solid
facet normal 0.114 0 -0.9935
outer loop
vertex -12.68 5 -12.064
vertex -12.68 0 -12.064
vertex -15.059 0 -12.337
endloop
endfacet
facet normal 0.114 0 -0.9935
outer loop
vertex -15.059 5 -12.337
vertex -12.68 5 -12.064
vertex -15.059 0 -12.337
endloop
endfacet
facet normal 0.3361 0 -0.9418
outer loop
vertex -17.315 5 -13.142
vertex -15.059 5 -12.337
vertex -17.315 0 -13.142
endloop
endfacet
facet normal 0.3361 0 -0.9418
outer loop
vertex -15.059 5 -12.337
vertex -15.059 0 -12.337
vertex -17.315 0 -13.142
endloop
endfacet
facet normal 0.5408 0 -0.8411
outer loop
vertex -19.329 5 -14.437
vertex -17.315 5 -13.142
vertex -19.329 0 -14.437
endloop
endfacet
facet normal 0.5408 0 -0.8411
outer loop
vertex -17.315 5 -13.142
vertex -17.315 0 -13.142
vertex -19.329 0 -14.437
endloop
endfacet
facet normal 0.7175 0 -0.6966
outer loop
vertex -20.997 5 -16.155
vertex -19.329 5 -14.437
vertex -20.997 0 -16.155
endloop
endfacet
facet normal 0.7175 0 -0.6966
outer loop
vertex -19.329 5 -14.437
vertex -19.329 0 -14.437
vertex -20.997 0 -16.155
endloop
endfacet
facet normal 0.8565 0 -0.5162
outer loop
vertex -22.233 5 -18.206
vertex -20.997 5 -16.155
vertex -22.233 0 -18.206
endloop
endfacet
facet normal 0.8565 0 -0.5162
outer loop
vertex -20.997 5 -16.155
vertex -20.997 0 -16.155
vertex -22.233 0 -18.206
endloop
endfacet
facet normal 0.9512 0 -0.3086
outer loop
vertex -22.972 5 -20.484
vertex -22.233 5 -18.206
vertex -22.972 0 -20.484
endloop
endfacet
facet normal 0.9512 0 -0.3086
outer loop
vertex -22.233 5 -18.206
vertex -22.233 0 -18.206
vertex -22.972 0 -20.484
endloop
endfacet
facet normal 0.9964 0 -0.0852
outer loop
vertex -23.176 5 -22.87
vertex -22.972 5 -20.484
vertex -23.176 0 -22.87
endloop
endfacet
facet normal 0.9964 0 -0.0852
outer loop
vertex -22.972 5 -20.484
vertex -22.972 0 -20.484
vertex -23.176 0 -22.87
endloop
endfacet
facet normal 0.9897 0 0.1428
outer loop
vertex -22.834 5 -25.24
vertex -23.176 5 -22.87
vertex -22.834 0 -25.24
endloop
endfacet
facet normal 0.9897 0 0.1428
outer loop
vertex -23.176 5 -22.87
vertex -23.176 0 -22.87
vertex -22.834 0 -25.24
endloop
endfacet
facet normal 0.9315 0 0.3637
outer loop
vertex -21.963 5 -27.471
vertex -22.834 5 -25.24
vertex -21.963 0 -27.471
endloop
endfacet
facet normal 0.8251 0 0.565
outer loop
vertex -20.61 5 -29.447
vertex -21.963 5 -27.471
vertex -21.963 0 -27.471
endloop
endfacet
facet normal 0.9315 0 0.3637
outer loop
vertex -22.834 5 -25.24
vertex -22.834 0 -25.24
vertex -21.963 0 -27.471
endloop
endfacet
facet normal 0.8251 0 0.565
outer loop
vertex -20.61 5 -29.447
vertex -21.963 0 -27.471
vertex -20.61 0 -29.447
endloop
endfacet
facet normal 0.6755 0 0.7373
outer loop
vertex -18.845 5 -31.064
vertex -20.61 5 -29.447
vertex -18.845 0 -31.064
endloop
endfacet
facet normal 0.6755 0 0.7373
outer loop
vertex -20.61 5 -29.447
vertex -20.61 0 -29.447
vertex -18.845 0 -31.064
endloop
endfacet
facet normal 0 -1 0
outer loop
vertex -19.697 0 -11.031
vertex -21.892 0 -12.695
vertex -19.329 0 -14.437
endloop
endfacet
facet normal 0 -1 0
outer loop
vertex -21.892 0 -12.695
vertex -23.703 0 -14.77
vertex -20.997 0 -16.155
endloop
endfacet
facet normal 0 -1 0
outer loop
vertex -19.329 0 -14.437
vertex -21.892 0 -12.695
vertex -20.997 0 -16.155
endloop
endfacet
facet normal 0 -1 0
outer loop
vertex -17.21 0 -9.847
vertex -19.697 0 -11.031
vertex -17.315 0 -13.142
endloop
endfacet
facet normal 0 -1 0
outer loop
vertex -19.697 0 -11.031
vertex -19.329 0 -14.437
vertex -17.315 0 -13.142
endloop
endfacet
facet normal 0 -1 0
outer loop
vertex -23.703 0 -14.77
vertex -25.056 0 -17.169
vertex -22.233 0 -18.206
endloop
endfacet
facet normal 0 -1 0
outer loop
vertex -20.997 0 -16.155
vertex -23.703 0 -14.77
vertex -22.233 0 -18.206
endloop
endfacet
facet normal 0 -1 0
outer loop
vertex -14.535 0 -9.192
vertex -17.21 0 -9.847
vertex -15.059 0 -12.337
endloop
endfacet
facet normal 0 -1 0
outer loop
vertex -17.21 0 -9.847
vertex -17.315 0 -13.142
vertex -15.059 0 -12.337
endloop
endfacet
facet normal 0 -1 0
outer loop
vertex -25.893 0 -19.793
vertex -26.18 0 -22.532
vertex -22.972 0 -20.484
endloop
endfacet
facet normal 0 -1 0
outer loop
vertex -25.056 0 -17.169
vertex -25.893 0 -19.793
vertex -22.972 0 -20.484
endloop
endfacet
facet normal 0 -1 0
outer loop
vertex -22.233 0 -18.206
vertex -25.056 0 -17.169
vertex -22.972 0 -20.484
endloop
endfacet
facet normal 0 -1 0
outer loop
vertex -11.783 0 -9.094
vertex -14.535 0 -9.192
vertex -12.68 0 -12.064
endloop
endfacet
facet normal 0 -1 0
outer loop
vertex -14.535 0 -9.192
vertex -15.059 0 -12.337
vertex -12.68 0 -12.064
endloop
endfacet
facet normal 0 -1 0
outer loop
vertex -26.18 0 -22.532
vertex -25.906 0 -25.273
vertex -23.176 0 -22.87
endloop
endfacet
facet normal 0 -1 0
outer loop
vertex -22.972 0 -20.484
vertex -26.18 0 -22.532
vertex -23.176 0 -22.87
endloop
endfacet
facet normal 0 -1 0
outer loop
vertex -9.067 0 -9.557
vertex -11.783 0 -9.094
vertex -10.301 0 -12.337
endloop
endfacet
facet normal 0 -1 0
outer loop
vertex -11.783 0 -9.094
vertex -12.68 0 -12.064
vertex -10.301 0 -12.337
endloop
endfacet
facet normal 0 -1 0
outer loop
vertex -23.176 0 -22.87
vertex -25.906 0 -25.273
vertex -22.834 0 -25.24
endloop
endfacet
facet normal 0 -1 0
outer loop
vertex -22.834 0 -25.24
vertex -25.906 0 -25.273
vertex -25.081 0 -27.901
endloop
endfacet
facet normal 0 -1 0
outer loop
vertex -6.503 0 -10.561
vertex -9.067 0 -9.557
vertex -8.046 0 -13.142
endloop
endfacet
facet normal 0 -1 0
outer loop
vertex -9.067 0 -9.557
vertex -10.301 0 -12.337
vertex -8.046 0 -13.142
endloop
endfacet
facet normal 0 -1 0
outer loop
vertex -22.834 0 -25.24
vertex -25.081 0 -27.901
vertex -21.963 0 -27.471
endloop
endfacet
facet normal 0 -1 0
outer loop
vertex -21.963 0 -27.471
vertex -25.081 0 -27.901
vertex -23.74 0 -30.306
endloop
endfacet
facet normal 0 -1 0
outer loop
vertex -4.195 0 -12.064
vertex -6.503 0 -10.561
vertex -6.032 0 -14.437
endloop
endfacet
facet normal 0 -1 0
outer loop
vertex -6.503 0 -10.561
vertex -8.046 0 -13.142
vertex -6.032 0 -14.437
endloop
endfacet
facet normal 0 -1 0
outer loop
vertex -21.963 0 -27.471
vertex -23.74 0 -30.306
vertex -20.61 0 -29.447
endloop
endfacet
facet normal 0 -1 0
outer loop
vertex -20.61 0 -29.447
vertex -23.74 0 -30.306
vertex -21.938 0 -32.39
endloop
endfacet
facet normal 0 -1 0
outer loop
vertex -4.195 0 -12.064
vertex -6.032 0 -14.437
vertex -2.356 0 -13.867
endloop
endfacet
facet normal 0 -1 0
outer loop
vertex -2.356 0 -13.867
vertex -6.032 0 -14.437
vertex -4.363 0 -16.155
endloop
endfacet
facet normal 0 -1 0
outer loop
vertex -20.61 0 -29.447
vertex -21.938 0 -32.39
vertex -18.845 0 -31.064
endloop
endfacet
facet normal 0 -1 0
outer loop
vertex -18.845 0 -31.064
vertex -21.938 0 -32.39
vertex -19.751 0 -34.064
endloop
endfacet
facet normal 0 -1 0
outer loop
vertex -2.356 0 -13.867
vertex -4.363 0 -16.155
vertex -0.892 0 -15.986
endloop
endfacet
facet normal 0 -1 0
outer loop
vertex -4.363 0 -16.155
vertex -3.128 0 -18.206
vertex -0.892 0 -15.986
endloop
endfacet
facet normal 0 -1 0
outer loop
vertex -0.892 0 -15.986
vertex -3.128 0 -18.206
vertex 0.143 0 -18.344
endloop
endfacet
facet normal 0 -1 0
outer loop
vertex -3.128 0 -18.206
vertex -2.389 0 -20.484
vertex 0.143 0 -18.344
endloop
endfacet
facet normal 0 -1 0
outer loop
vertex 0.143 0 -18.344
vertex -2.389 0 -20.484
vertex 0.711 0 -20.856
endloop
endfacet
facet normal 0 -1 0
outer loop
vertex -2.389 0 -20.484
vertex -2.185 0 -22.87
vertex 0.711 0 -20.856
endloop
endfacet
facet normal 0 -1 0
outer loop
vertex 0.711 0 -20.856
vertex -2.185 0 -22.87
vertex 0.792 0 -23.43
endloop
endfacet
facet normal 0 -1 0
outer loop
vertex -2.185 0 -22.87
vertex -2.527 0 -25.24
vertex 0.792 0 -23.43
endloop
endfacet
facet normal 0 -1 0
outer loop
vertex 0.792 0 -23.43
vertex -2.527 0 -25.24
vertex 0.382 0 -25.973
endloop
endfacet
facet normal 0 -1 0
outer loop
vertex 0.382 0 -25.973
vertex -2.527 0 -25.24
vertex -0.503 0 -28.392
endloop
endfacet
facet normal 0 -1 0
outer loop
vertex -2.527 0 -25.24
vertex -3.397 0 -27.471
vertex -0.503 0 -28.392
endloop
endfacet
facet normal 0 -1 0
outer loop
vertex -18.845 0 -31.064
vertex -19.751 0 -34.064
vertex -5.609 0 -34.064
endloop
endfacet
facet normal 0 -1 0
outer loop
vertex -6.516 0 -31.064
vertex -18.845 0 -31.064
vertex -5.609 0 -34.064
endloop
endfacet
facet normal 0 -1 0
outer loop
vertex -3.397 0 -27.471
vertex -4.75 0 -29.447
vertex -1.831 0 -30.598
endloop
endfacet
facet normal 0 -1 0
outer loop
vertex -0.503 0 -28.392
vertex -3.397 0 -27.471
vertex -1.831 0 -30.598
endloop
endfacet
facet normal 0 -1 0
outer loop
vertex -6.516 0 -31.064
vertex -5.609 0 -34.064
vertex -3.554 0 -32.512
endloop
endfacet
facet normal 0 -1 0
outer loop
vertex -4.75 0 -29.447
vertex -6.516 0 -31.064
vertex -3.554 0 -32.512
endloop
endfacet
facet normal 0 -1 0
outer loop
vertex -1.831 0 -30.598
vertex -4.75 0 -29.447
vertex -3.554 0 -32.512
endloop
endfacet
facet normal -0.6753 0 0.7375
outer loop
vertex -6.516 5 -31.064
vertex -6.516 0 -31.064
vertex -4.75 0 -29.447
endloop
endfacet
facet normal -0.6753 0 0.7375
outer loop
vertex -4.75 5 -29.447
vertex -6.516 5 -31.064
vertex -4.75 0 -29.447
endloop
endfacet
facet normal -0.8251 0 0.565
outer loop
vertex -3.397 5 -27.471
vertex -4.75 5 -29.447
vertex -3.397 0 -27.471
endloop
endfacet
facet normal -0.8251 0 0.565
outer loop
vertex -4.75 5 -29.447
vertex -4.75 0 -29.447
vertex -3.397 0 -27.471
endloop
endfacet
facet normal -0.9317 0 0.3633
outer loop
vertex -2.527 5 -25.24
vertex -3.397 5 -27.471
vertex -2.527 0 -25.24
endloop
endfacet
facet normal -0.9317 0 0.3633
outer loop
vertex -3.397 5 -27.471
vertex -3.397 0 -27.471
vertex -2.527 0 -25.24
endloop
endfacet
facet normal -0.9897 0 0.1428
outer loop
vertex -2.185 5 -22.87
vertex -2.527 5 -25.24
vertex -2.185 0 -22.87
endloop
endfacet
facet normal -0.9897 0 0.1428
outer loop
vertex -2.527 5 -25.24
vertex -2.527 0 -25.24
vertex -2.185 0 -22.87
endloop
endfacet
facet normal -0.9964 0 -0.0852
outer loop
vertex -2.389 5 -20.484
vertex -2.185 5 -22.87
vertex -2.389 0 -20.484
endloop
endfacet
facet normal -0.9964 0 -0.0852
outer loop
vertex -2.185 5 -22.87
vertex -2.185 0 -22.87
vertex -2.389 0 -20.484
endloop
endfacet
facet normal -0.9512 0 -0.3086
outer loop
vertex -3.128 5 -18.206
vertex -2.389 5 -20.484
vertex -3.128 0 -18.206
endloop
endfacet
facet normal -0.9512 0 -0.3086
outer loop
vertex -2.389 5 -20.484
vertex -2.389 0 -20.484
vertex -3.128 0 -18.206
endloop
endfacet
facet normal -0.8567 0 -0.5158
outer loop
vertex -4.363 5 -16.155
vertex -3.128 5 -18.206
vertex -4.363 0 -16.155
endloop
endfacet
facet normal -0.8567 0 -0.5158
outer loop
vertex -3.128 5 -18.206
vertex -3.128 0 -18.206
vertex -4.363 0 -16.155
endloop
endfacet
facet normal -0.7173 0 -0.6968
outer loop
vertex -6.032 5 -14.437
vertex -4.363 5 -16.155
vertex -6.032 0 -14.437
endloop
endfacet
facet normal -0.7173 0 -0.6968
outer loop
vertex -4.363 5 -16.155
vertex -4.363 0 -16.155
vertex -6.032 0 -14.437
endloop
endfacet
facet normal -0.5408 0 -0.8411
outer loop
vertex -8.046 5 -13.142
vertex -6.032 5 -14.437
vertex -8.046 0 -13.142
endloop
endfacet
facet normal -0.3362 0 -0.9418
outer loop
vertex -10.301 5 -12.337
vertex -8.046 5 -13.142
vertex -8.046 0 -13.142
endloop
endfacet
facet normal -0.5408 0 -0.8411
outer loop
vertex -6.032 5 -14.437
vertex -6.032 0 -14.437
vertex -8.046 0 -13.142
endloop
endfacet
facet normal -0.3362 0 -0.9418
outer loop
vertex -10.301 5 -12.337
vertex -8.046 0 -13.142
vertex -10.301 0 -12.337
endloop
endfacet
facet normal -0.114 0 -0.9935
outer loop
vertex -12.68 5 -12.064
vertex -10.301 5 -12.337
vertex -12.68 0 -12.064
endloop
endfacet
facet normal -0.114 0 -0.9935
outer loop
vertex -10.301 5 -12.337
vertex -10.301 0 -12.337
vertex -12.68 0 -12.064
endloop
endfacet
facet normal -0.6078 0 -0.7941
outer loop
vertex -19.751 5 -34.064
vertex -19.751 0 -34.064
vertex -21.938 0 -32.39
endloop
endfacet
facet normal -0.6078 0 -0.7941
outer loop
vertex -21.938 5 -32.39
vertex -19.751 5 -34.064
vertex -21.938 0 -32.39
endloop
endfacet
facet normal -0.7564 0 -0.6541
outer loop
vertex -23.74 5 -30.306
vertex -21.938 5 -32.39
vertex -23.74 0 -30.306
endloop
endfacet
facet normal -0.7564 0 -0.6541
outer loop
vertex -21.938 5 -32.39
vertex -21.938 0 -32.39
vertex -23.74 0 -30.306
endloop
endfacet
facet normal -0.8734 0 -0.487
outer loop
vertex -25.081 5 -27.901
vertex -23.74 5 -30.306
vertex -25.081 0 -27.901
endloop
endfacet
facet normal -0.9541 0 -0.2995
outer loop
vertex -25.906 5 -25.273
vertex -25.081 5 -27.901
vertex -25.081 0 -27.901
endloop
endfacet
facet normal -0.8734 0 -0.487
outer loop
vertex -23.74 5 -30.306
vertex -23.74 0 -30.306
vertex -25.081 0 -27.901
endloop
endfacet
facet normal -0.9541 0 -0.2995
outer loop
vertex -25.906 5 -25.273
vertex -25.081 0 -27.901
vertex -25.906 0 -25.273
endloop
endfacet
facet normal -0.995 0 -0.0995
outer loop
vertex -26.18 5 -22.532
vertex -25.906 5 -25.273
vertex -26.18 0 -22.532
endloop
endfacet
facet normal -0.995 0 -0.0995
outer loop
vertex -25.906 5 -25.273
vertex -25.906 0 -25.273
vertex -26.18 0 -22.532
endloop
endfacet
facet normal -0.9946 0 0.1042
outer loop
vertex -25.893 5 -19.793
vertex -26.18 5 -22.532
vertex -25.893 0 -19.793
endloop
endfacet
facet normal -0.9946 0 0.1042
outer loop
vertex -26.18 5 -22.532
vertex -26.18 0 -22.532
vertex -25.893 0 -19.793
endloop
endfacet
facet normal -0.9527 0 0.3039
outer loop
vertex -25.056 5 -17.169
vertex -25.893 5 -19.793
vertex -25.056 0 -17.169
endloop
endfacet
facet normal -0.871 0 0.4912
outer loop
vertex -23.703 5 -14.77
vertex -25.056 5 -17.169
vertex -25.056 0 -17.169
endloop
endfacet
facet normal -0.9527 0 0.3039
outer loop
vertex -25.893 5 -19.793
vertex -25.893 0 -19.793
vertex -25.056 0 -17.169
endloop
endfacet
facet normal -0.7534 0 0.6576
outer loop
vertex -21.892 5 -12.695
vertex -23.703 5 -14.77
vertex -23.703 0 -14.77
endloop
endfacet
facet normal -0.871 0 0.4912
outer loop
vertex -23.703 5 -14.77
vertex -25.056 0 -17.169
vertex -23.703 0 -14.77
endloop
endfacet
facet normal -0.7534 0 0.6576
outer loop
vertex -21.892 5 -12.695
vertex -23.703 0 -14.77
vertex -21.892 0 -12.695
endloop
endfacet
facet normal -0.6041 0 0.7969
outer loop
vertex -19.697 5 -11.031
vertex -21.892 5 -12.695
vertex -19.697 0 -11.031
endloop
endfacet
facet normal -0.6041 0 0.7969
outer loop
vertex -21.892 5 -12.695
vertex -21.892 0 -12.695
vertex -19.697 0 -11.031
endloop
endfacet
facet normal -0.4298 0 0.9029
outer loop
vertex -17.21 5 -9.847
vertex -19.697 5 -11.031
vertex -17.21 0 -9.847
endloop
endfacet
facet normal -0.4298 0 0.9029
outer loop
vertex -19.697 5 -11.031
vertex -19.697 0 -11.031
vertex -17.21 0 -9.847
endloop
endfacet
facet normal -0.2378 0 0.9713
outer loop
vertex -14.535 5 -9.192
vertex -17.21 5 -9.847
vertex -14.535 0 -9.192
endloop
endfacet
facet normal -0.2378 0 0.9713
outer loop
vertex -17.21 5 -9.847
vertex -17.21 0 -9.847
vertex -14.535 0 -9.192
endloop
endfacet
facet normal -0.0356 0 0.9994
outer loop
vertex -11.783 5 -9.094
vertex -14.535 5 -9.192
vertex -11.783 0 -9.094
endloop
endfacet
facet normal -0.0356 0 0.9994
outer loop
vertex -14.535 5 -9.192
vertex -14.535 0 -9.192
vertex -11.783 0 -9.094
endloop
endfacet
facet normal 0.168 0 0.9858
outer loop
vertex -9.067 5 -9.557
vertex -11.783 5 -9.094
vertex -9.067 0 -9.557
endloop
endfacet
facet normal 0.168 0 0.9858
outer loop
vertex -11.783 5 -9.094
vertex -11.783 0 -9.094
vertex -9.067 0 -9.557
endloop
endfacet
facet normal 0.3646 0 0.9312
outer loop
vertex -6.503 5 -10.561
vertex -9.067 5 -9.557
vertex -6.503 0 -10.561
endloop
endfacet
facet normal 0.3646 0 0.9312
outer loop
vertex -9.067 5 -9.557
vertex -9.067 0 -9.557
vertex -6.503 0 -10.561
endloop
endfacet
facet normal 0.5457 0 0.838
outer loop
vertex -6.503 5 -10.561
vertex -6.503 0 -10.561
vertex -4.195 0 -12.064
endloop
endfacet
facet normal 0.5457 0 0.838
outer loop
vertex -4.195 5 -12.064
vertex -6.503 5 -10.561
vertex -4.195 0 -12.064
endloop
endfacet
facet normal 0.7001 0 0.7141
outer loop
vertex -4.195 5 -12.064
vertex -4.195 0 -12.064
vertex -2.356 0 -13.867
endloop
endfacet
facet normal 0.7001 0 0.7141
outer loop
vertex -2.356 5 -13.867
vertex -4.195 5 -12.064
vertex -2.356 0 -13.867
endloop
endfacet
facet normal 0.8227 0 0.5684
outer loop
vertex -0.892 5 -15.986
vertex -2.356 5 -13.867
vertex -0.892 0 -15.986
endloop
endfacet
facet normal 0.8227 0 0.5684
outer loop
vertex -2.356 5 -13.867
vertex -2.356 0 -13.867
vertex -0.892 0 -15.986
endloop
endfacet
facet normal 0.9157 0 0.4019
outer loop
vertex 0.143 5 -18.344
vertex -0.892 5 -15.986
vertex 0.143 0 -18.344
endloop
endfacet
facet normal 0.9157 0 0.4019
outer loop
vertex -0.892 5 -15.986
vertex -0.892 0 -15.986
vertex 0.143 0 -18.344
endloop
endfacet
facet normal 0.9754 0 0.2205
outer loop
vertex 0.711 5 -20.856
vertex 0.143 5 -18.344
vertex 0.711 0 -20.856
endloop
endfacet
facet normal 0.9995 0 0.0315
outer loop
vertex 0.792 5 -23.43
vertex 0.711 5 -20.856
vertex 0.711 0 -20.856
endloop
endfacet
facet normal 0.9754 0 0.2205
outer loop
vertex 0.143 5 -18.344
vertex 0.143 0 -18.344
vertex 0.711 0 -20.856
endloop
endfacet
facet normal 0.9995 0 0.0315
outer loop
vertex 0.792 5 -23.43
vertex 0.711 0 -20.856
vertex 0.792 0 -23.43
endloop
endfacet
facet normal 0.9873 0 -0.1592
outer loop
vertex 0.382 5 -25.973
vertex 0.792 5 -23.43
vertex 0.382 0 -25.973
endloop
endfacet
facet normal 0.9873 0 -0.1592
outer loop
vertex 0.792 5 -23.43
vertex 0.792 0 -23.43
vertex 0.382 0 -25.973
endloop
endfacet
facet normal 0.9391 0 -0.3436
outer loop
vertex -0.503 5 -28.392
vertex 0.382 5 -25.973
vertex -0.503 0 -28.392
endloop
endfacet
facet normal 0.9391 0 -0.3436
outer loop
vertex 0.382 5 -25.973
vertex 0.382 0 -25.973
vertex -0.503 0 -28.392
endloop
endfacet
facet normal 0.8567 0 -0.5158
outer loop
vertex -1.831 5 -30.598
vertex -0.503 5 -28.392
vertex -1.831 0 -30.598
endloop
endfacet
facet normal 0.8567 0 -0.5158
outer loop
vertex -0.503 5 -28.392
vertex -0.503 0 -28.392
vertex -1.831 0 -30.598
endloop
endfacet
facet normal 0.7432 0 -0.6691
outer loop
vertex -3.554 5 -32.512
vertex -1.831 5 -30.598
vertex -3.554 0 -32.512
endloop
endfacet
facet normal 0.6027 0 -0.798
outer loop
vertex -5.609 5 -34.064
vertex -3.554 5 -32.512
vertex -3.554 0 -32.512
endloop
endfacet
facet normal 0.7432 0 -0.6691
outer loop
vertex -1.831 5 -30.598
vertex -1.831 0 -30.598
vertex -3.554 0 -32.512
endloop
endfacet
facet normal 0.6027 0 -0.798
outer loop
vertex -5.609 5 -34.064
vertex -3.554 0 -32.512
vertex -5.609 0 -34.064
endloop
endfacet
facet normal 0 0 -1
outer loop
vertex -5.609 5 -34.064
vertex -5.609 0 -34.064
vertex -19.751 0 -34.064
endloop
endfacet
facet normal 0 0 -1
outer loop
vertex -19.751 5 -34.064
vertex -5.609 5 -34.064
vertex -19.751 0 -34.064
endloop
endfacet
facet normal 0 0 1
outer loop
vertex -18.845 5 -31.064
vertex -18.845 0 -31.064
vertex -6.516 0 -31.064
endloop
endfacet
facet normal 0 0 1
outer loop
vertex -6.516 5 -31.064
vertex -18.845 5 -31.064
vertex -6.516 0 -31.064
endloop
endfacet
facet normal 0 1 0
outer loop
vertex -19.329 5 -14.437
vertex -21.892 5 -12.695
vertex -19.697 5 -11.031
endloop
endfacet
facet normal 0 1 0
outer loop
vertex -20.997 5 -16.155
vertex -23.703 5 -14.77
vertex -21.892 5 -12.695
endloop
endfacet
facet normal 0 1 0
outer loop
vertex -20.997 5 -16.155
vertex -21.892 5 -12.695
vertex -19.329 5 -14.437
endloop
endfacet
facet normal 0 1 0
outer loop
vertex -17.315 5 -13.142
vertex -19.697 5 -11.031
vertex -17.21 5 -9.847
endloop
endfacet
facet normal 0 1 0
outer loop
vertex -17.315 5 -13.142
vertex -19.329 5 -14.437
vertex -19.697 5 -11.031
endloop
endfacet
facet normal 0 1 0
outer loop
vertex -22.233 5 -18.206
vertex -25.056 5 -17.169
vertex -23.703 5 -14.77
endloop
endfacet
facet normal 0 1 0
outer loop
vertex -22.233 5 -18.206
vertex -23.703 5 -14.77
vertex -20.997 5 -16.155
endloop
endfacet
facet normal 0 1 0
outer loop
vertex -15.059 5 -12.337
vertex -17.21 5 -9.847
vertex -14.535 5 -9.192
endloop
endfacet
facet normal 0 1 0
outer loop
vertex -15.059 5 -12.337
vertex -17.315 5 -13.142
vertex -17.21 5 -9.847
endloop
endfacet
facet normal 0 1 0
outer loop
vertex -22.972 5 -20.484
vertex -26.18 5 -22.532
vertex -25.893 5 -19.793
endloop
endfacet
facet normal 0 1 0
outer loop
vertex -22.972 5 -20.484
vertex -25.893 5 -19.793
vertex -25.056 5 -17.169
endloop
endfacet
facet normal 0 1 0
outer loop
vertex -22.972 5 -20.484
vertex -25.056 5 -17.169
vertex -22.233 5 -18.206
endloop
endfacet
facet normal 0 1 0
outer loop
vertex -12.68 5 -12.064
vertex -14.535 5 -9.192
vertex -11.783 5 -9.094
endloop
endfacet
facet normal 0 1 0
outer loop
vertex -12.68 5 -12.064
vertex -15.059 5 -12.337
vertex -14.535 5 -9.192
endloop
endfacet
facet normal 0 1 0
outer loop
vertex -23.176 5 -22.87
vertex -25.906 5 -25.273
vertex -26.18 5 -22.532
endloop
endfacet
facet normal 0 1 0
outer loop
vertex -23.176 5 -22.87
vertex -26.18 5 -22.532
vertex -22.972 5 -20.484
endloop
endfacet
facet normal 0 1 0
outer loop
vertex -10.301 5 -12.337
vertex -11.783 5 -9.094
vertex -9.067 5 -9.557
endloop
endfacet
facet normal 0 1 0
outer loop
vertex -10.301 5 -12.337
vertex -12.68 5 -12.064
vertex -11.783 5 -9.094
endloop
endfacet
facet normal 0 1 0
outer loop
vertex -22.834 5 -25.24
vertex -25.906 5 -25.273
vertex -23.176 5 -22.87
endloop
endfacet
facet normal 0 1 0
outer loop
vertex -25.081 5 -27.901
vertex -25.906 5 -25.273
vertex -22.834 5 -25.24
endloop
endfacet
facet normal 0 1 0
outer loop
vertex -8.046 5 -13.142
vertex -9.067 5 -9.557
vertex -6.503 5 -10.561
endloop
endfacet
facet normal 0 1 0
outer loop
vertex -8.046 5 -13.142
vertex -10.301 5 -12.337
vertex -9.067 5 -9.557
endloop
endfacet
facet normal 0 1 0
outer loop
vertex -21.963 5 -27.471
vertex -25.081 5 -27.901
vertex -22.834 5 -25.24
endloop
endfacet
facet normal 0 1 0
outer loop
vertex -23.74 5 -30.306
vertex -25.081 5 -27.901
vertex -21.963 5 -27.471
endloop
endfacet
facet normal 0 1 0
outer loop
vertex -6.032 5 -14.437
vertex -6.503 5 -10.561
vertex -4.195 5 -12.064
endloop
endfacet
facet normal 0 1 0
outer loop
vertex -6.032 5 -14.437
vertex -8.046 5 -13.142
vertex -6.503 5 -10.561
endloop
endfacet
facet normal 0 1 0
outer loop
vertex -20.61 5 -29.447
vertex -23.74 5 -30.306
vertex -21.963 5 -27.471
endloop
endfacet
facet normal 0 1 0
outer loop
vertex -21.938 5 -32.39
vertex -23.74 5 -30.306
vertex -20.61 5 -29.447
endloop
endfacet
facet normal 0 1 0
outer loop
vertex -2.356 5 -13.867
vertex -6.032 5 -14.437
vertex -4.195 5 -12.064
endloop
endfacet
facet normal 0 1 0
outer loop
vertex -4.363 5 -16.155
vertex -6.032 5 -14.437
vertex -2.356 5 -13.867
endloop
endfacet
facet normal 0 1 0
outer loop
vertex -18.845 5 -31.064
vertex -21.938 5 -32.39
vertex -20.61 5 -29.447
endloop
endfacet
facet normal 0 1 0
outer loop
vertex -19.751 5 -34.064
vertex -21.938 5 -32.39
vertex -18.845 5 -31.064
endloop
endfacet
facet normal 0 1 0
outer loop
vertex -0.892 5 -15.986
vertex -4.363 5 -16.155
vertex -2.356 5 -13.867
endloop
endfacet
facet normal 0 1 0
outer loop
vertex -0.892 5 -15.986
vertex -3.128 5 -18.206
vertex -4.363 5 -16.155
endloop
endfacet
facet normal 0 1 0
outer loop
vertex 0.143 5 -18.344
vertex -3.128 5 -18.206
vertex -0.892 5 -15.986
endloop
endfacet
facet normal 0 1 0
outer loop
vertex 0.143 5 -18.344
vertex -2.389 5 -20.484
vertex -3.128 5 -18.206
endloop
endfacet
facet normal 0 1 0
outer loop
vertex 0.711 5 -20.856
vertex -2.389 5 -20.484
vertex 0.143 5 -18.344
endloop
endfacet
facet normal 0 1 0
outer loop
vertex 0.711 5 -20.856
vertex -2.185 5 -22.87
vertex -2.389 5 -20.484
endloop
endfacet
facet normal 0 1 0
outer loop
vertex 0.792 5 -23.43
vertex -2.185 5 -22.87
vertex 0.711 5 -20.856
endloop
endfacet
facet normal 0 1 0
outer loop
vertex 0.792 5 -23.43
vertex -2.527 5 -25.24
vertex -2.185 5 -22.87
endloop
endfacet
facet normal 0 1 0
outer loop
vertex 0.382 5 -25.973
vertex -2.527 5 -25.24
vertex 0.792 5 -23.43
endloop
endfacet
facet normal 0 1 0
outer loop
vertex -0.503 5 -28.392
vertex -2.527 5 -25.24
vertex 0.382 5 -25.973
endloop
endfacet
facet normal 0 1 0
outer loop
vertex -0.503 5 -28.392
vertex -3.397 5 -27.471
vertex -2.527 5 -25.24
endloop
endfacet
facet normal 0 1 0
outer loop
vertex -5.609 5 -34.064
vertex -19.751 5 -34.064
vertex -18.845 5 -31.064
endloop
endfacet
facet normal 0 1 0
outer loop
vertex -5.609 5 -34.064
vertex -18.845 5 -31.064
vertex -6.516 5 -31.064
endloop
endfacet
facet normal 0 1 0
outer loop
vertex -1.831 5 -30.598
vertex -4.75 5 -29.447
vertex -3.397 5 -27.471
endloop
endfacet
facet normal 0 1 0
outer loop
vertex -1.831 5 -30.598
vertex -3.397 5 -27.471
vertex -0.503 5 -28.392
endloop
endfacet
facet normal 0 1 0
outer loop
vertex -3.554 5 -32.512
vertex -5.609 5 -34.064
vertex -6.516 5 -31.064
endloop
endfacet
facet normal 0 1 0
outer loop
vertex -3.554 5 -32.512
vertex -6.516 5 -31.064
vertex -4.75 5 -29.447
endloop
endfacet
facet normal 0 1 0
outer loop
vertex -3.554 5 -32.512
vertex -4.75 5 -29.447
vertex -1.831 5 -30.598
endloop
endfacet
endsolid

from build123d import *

# Parameters (mm, degrees)
BOSS_EXTRU_2_DEPTH = 5


with BuildPart() as part:
    # Esquisse2 → Boss.-Extru.2 (new body)
    with BuildSketch(Plane(origin=(0, 0, 0), x_dir=(1, 0, 0), z_dir=(0, 1, 0))):
        with BuildLine():
            ThreePointArc((-19.751463333, 34.064312188), (-23.703099364, 14.770083553), (-4.195114147, 12.064312188))
            ThreePointArc((-4.195114147, 12.064312188), (0.791798064, 23.430337591), (-5.609327709, 34.064312188))
            Line((-5.609327709, 34.064312188), (-19.751463333, 34.064312188))
        make_face()
        with BuildLine():
            Line((-18.844809524, 31.064312188), (-6.515981518, 31.064312188))
            ThreePointArc((-6.515981518, 31.064312188), (-2.692903343, 19.323941838), (-12.680395521, 12.064312188))
            ThreePointArc((-12.680395521, 12.064312188), (-22.667887699, 19.323941838), (-18.844809524, 31.064312188))
        make_face(mode=Mode.SUBTRACT)
    extrude(amount=BOSS_EXTRU_2_DEPTH)


solid = part.part
